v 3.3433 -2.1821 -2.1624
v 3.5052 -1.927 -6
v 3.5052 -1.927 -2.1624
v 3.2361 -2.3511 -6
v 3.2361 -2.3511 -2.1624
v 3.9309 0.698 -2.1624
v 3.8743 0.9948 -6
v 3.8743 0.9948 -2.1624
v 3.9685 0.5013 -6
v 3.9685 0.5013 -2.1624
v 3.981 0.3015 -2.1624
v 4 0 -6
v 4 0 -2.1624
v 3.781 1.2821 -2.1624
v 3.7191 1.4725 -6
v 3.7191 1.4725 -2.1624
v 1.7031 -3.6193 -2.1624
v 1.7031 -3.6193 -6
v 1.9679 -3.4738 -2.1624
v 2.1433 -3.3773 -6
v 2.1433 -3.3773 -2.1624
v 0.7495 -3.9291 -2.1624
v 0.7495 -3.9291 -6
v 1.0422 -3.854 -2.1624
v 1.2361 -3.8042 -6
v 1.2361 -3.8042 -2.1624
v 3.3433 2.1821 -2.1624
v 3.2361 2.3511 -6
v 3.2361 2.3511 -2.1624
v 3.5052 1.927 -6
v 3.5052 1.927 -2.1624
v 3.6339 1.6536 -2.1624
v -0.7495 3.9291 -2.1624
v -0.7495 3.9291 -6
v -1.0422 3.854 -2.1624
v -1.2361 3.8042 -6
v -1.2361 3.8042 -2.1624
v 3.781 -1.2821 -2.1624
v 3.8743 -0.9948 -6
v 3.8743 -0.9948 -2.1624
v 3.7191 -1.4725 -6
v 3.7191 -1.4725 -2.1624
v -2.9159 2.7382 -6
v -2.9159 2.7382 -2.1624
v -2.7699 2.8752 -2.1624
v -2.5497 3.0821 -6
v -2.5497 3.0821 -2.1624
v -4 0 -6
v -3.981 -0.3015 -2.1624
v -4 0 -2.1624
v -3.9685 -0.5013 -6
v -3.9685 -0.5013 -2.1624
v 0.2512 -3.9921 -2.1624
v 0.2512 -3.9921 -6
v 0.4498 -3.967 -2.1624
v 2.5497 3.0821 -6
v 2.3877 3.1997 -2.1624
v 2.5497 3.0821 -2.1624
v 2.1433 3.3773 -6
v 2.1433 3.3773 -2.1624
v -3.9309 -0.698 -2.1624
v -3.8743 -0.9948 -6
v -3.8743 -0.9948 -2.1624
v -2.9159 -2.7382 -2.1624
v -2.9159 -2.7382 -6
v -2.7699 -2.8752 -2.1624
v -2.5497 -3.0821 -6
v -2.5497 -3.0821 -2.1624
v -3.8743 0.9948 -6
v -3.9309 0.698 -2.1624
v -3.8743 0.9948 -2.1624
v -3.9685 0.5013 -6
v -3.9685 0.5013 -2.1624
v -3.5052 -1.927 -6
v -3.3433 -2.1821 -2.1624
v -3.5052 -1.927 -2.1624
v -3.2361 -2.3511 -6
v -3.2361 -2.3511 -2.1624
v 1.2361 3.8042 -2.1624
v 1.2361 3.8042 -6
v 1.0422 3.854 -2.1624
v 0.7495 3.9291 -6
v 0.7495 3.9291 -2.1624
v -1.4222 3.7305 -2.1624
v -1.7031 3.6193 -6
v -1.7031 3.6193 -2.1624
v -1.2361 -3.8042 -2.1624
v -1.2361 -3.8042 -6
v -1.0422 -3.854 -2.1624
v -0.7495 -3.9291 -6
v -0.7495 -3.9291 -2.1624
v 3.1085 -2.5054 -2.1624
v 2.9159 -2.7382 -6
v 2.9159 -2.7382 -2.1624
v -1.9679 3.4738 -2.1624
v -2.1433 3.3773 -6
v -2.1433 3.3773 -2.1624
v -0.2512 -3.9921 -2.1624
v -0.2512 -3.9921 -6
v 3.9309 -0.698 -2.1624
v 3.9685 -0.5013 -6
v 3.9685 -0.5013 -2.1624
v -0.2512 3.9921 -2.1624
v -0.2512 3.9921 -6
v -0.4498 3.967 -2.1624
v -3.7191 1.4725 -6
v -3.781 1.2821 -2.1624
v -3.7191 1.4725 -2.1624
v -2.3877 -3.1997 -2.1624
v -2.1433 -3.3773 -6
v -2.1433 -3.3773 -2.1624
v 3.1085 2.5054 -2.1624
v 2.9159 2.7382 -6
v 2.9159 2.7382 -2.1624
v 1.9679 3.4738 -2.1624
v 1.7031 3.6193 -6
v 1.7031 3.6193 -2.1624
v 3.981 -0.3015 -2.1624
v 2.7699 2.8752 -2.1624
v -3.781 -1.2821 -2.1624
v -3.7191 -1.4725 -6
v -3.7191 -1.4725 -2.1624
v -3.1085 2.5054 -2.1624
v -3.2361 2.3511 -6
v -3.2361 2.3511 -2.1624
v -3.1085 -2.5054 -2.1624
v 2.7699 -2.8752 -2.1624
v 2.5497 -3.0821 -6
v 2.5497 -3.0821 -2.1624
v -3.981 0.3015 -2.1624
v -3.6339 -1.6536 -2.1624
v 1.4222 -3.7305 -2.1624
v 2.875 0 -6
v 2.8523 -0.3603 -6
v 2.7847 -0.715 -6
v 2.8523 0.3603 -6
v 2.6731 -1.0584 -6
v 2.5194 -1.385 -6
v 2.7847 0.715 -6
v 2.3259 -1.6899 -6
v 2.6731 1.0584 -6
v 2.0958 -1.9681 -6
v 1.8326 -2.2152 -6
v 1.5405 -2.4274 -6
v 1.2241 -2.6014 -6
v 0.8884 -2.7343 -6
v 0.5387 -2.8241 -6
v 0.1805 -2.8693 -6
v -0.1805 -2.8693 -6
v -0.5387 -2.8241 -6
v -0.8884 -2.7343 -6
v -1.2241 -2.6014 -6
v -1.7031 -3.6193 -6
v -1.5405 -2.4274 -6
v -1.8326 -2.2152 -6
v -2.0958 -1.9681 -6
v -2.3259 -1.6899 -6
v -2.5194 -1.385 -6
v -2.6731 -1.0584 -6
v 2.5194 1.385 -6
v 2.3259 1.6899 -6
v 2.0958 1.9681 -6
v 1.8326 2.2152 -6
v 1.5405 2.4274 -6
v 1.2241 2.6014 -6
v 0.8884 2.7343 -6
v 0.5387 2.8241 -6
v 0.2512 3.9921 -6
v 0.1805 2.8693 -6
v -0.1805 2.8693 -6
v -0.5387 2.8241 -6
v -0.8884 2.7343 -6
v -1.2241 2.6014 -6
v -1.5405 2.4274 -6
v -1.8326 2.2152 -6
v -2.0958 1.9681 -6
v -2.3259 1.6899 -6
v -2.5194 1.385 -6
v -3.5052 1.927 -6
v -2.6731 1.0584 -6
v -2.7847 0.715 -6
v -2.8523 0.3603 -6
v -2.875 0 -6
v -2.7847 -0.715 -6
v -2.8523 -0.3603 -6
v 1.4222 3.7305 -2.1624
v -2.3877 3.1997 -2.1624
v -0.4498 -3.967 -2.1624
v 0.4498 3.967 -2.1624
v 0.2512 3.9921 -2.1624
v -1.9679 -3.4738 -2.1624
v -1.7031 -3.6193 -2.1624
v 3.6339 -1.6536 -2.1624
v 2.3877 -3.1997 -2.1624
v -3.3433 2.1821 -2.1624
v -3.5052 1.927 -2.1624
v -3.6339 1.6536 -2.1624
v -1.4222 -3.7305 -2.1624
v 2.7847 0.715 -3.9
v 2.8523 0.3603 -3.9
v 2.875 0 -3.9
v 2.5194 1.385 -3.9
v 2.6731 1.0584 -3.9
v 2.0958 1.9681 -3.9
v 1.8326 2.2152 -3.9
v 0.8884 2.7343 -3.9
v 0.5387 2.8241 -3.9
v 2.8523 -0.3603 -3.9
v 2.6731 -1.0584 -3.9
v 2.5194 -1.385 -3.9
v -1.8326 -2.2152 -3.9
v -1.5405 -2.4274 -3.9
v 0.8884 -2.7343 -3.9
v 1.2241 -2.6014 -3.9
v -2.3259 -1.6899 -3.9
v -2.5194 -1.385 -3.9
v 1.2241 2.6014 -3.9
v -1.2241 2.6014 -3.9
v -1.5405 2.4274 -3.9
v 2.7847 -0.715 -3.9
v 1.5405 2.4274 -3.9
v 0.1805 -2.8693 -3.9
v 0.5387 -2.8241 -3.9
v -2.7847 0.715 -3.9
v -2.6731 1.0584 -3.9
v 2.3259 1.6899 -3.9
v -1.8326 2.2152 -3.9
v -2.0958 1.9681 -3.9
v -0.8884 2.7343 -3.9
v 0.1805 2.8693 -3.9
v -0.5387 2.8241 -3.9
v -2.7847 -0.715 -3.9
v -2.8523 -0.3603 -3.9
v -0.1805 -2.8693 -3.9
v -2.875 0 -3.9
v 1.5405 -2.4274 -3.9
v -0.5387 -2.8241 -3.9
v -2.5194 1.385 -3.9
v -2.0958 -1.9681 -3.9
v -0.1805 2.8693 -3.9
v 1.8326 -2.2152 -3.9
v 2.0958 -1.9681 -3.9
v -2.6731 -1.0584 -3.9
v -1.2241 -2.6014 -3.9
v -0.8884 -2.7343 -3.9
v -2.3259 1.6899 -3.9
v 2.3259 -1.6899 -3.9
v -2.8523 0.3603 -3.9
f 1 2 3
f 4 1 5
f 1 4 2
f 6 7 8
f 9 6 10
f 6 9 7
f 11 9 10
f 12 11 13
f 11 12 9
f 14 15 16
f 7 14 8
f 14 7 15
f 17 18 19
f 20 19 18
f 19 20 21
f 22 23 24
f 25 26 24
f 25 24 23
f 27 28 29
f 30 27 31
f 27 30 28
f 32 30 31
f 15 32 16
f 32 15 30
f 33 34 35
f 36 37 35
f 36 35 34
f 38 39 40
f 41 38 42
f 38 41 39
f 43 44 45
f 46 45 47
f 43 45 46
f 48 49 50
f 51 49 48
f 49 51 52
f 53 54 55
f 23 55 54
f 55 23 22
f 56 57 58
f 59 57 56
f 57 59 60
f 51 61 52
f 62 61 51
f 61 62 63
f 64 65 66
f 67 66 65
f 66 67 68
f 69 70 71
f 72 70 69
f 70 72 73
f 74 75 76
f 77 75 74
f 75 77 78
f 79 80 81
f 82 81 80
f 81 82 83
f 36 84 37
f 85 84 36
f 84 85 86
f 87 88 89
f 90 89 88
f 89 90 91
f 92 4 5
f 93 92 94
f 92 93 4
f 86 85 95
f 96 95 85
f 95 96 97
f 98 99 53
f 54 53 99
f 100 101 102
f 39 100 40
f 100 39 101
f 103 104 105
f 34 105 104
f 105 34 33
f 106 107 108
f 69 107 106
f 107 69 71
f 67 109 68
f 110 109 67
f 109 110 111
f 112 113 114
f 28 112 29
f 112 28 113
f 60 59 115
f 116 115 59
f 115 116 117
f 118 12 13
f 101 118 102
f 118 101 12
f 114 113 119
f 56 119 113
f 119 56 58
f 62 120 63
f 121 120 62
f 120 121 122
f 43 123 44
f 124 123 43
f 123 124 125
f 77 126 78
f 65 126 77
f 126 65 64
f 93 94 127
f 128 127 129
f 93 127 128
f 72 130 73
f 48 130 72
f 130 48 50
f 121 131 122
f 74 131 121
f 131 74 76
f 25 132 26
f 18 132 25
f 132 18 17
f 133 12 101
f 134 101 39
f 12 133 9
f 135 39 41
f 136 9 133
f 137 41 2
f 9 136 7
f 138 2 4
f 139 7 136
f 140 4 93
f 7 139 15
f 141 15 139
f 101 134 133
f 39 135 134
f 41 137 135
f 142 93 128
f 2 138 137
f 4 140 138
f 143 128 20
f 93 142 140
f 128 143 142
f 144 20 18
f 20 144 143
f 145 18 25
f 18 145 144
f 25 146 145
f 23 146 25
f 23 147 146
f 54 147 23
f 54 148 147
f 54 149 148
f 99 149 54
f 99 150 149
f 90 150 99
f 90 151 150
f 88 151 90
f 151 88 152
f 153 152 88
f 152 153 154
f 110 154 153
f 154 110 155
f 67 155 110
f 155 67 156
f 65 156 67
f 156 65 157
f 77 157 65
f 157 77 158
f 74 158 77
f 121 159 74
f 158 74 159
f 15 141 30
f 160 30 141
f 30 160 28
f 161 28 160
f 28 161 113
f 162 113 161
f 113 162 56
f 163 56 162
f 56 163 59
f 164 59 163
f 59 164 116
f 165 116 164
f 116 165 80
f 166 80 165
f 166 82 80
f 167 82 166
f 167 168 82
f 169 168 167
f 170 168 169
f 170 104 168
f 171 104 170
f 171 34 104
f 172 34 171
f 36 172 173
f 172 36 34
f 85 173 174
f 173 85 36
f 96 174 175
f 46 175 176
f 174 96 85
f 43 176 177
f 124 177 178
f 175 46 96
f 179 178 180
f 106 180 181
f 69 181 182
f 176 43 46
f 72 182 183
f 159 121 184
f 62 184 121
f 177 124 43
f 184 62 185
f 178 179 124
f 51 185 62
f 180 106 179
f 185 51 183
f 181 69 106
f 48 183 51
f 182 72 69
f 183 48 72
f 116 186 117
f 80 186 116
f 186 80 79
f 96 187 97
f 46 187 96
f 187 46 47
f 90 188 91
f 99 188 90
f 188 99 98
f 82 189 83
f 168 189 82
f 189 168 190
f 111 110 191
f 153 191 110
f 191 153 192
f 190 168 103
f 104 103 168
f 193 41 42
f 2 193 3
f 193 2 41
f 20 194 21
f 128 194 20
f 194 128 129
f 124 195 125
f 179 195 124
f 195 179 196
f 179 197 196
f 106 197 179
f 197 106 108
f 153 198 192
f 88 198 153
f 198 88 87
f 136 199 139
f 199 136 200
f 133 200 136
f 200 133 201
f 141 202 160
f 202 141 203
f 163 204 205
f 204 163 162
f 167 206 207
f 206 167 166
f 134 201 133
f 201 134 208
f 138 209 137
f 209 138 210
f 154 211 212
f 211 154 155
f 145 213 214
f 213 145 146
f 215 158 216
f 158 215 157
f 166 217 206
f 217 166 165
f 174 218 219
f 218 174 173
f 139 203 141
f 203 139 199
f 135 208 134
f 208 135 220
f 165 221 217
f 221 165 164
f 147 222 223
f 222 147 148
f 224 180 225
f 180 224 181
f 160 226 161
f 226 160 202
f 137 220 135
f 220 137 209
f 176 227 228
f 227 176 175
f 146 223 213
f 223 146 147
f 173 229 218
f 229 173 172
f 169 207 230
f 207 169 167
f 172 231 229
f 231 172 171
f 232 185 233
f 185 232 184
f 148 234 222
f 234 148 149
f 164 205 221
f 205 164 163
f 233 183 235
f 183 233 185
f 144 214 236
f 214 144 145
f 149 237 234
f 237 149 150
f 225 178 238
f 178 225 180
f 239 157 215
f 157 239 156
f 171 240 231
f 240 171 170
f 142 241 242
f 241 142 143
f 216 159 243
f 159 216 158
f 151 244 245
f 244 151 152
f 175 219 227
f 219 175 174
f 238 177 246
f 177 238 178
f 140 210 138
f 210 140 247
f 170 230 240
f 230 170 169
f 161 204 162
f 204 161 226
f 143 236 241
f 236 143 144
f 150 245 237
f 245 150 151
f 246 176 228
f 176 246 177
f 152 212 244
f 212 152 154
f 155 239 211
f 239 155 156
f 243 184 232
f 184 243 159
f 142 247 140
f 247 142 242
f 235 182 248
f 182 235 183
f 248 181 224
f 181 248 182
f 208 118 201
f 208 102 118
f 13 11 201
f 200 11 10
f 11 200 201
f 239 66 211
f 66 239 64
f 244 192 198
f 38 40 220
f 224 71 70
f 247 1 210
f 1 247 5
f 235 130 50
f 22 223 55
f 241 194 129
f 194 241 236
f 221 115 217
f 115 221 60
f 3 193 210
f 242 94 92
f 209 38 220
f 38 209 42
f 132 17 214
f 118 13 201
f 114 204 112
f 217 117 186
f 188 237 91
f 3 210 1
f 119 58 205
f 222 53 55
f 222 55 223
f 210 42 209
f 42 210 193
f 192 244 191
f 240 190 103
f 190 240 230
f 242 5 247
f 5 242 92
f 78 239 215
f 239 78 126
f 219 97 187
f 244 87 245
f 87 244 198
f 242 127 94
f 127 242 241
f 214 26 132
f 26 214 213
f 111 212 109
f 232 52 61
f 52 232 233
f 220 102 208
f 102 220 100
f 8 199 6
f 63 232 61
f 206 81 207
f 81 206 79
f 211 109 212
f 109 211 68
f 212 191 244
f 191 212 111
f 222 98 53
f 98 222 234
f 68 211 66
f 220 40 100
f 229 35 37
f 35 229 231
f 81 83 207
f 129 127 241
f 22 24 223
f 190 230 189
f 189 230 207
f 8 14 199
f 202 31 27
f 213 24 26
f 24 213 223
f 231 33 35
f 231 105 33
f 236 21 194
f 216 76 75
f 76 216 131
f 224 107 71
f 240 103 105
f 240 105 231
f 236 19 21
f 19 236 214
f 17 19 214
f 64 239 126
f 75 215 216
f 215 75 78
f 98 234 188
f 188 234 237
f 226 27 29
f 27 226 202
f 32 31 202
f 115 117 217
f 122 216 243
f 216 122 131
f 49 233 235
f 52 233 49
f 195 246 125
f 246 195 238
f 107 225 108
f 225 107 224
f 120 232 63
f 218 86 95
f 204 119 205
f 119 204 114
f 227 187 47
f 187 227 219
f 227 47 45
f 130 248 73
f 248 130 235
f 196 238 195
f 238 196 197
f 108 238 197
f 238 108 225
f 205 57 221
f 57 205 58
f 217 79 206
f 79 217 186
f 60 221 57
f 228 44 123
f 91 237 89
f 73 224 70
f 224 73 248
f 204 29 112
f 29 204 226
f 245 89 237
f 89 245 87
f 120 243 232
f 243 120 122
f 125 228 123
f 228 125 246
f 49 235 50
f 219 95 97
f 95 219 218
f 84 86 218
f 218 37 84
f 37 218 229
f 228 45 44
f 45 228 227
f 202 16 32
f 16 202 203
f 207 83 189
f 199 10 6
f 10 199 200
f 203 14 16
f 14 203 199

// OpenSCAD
$fn = 50;

difference() {
	union() {
		translate(v = [0, 0, -6.0]) {
			cylinder(h = 6, r = 4.0);
		}
		#translate(v = [0, 0, -9.0]) {
			cylinder(h = 9, r = 2.875);
		}
	}
	union() {
		translate(v = [0, 0, 0]) {
			rotate(a = [0, 0, 0]) {
				difference() {
					union() {
						translate(v = [0, 0, -9.0]) {
							cylinder(h = 9, r = 2.6);
						}
						translate(v = [0, 0, -3.9]) {
							cylinder(h = 3.9, r1 = 2.875, r2 = 5.4);
						}
						translate(v = [0, 0, -9.0]) {
							cylinder(h = 9, r = 2.875);
						}
						translate(v = [0, 0, -9.0]) {
							cylinder(h = 9, r = 2.6);
						}
					}
					union();
				}
			}
		}
	}
}
